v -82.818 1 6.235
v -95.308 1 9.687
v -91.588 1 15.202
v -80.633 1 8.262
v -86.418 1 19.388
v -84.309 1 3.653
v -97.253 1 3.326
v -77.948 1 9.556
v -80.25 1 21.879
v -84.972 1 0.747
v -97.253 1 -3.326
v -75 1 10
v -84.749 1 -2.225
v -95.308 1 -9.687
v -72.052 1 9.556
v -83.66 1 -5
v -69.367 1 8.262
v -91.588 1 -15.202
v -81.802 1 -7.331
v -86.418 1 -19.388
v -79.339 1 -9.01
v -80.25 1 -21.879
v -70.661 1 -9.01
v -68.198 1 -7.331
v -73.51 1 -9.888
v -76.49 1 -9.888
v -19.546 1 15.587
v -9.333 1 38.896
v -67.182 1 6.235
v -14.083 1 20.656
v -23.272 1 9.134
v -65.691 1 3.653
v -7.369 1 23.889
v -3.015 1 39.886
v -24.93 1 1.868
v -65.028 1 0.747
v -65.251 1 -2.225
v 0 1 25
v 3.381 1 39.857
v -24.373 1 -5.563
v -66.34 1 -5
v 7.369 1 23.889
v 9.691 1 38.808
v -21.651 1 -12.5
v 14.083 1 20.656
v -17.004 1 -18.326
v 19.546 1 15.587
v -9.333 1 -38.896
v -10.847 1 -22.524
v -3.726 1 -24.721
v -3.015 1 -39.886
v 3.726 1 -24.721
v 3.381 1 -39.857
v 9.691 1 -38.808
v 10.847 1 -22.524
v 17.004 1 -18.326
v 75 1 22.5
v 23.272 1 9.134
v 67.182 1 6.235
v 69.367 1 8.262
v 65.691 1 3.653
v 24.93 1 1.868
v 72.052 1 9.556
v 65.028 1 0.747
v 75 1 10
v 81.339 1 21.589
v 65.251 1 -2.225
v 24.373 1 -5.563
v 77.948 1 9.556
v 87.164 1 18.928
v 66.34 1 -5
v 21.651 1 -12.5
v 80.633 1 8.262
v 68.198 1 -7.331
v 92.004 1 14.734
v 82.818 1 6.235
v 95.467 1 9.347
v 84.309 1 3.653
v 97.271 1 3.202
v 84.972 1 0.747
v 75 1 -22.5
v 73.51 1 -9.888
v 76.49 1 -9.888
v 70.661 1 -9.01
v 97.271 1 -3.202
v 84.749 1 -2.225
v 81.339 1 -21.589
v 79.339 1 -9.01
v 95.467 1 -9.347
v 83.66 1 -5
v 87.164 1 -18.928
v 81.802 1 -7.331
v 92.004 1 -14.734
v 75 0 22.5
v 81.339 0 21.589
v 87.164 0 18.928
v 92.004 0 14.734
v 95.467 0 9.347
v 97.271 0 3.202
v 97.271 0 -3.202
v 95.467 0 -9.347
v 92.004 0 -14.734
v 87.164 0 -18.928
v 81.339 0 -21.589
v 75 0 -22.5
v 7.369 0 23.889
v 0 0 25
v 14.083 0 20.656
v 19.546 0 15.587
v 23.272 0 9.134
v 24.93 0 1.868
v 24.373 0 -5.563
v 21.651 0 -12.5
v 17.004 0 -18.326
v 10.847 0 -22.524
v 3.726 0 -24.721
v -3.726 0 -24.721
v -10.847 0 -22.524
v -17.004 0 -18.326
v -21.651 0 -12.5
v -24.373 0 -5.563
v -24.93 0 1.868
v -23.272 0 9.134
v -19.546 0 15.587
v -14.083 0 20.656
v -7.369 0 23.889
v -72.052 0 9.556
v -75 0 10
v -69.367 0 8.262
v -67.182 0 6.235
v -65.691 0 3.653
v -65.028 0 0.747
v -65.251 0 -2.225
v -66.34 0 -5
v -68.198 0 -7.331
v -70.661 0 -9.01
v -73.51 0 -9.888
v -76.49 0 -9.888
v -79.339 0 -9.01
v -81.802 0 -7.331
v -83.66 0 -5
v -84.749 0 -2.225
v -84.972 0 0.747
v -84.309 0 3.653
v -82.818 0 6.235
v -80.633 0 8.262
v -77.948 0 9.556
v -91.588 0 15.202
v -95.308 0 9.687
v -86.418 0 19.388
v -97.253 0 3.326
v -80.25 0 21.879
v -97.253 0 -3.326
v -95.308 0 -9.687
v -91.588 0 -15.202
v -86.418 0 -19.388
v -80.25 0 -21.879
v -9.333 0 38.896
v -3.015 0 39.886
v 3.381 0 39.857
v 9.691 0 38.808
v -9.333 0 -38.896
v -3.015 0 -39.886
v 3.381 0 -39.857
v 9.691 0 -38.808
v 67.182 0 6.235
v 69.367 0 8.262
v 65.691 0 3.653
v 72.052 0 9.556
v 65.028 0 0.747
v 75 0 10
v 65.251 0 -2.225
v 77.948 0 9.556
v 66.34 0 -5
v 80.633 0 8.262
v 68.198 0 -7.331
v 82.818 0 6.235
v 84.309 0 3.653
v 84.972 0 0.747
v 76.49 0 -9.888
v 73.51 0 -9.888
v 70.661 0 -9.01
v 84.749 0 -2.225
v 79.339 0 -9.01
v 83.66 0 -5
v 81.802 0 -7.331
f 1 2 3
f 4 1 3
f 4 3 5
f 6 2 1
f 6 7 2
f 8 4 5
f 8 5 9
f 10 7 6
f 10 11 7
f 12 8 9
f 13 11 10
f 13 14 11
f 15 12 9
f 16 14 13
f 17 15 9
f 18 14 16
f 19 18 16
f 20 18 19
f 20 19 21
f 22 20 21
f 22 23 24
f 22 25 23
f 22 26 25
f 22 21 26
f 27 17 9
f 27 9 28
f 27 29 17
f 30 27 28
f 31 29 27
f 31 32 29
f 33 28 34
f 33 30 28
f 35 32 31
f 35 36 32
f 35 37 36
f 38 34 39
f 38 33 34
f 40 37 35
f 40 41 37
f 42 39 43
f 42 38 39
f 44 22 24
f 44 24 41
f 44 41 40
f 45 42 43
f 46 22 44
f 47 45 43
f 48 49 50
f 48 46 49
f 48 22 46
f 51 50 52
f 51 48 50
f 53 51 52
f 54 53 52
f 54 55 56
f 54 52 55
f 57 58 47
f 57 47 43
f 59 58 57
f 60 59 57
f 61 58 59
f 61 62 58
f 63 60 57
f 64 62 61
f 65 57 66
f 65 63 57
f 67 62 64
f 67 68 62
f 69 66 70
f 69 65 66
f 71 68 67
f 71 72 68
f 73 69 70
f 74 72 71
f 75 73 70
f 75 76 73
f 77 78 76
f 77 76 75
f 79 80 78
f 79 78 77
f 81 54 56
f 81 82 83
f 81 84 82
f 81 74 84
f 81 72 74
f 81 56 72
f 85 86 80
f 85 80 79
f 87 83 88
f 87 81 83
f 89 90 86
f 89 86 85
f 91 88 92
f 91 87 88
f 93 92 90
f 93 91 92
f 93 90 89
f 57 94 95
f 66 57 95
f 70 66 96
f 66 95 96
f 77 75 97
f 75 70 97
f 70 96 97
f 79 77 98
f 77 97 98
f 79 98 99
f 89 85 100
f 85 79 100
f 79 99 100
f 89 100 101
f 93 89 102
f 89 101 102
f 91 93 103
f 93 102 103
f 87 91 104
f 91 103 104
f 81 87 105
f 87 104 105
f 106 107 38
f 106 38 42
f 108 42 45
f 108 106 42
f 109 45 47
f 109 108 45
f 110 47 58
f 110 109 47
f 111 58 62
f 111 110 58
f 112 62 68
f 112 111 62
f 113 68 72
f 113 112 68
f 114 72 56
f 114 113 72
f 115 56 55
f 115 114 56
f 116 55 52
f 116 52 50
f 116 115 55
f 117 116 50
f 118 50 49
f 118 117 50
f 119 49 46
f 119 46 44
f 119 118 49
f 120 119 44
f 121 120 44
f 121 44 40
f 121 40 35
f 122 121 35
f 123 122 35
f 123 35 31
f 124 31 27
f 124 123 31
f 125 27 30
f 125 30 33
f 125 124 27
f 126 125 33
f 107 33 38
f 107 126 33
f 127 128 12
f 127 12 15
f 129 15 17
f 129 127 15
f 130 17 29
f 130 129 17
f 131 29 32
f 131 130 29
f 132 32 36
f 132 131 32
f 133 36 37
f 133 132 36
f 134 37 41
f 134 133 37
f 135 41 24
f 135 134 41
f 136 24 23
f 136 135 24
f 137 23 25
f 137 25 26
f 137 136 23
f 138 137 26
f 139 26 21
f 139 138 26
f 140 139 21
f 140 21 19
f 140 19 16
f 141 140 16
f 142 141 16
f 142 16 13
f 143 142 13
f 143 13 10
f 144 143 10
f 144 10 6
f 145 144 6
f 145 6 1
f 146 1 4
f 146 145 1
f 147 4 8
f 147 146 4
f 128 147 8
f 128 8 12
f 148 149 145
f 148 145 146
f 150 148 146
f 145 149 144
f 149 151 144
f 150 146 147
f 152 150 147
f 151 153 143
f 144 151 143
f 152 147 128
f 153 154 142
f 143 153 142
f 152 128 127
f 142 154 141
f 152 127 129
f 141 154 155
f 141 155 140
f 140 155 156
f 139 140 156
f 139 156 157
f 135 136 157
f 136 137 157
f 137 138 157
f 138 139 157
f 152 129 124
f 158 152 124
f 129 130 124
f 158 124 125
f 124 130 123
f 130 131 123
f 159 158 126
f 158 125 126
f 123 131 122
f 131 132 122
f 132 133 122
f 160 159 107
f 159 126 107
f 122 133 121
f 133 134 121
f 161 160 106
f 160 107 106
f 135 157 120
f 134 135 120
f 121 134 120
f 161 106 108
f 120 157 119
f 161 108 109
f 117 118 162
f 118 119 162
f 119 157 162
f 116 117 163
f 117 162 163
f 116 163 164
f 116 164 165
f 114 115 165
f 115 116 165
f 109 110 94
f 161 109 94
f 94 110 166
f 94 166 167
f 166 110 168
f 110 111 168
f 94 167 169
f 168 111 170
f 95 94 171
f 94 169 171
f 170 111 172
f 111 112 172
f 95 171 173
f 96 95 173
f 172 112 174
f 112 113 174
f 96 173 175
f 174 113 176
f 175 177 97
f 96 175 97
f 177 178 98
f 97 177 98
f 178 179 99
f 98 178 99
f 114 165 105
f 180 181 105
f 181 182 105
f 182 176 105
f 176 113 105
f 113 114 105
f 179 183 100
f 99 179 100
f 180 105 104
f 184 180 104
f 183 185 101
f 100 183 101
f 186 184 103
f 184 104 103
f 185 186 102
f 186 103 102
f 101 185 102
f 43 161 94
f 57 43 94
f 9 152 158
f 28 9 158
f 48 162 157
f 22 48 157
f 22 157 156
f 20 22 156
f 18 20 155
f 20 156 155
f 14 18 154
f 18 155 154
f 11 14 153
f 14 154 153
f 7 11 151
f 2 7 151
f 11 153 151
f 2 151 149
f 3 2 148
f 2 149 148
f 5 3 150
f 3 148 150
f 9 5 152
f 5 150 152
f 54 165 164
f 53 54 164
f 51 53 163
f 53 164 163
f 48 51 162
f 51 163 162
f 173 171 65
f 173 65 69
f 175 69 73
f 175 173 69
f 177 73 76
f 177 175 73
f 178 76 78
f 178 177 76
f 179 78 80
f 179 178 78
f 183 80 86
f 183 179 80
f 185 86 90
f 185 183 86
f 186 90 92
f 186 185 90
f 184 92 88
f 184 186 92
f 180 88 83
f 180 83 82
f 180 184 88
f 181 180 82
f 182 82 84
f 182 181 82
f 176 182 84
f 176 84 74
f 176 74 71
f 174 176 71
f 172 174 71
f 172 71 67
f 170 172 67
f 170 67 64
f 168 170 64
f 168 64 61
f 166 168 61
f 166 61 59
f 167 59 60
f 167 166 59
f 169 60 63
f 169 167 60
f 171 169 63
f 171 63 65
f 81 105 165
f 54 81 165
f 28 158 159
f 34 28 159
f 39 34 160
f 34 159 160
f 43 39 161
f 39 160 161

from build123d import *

# Parameters (mm, degrees)
SKETCH1_R           = 22.5
SKETCH1_R_2         = 10
SKETCH1_R_3         = 40
SKETCH1_R_4         = 25
BOSS_EXTRUDE1_DEPTH = 1


with BuildPart() as part:
    # Sketch1 → Boss-Extrude1 (new body)
    # profile 1 of 5: a face of its own
    with BuildSketch(Plane(origin=(0, 0, 0), x_dir=(1, 0, 0), z_dir=(0, 1, 0))):
        with Locations((-75, 0)):
            Circle(SKETCH1_R)
        with Locations(Location((-75, 0, 0), (0, 0, 270))):
            Circle(SKETCH1_R_2, mode=Mode.SUBTRACT)
    # profile 2 of 5: a face of its own
    with BuildSketch(Plane(origin=(0, 0, 0), x_dir=(1, 0, 0), z_dir=(0, 1, 0))):
        with BuildLine():
            ThreePointArc((-52.5, 0), (-61.069368284, -17.668828484), (-80.25, -21.878928219))
            Line((-80.25, -21.878928219), (-9.333333333, -38.895872389))
            ThreePointArc((-9.333333333, -38.895872389), (-40, 0), (-9.333333333, 38.895872389))
            Line((-9.333333333, 38.895872389), (-80.25, 21.878928219))
            ThreePointArc((-80.25, 21.878928219), (-61.069368284, 17.668828484), (-52.5, 0))
        make_face()
    # profile 3 of 5: a face of its own
    with BuildSketch(Plane(origin=(0, 0, 0), x_dir=(1, 0, 0), z_dir=(0, 1, 0))):
        Circle(SKETCH1_R_3)
        with Locations(Location((0, 0, 0), (0, 0, 270))):
            Circle(SKETCH1_R_4, mode=Mode.SUBTRACT)
    # profile 4 of 5: a face of its own
    with BuildSketch(Plane(origin=(0, 0, 0), x_dir=(1, 0, 0), z_dir=(0, 1, 0))):
        with BuildLine():
            ThreePointArc((40, 0), (31.524856574, -24.620792392), (9.6908291, -38.808347444))
            Line((9.6908291, -38.808347444), (75, -22.5))
            ThreePointArc((75, -22.5), (52.5, 0), (75, 22.5))
            Line((75, 22.5), (9.6908291, 38.808347444))
            ThreePointArc((9.6908291, 38.808347444), (31.524856574, 24.620792392), (40, 0))
        make_face()
    # profile 5 of 5: a face of its own
    with BuildSketch(Plane(origin=(0, 0, 0), x_dir=(1, 0, 0), z_dir=(0, 1, 0))):
        with Locations((75, 0)):
            Circle(SKETCH1_R)
        with Locations(Location((75, 0, 0), (0, 0, 270))):
            Circle(SKETCH1_R_2, mode=Mode.SUBTRACT)
    extrude(amount=BOSS_EXTRUDE1_DEPTH)


solid = part.part
